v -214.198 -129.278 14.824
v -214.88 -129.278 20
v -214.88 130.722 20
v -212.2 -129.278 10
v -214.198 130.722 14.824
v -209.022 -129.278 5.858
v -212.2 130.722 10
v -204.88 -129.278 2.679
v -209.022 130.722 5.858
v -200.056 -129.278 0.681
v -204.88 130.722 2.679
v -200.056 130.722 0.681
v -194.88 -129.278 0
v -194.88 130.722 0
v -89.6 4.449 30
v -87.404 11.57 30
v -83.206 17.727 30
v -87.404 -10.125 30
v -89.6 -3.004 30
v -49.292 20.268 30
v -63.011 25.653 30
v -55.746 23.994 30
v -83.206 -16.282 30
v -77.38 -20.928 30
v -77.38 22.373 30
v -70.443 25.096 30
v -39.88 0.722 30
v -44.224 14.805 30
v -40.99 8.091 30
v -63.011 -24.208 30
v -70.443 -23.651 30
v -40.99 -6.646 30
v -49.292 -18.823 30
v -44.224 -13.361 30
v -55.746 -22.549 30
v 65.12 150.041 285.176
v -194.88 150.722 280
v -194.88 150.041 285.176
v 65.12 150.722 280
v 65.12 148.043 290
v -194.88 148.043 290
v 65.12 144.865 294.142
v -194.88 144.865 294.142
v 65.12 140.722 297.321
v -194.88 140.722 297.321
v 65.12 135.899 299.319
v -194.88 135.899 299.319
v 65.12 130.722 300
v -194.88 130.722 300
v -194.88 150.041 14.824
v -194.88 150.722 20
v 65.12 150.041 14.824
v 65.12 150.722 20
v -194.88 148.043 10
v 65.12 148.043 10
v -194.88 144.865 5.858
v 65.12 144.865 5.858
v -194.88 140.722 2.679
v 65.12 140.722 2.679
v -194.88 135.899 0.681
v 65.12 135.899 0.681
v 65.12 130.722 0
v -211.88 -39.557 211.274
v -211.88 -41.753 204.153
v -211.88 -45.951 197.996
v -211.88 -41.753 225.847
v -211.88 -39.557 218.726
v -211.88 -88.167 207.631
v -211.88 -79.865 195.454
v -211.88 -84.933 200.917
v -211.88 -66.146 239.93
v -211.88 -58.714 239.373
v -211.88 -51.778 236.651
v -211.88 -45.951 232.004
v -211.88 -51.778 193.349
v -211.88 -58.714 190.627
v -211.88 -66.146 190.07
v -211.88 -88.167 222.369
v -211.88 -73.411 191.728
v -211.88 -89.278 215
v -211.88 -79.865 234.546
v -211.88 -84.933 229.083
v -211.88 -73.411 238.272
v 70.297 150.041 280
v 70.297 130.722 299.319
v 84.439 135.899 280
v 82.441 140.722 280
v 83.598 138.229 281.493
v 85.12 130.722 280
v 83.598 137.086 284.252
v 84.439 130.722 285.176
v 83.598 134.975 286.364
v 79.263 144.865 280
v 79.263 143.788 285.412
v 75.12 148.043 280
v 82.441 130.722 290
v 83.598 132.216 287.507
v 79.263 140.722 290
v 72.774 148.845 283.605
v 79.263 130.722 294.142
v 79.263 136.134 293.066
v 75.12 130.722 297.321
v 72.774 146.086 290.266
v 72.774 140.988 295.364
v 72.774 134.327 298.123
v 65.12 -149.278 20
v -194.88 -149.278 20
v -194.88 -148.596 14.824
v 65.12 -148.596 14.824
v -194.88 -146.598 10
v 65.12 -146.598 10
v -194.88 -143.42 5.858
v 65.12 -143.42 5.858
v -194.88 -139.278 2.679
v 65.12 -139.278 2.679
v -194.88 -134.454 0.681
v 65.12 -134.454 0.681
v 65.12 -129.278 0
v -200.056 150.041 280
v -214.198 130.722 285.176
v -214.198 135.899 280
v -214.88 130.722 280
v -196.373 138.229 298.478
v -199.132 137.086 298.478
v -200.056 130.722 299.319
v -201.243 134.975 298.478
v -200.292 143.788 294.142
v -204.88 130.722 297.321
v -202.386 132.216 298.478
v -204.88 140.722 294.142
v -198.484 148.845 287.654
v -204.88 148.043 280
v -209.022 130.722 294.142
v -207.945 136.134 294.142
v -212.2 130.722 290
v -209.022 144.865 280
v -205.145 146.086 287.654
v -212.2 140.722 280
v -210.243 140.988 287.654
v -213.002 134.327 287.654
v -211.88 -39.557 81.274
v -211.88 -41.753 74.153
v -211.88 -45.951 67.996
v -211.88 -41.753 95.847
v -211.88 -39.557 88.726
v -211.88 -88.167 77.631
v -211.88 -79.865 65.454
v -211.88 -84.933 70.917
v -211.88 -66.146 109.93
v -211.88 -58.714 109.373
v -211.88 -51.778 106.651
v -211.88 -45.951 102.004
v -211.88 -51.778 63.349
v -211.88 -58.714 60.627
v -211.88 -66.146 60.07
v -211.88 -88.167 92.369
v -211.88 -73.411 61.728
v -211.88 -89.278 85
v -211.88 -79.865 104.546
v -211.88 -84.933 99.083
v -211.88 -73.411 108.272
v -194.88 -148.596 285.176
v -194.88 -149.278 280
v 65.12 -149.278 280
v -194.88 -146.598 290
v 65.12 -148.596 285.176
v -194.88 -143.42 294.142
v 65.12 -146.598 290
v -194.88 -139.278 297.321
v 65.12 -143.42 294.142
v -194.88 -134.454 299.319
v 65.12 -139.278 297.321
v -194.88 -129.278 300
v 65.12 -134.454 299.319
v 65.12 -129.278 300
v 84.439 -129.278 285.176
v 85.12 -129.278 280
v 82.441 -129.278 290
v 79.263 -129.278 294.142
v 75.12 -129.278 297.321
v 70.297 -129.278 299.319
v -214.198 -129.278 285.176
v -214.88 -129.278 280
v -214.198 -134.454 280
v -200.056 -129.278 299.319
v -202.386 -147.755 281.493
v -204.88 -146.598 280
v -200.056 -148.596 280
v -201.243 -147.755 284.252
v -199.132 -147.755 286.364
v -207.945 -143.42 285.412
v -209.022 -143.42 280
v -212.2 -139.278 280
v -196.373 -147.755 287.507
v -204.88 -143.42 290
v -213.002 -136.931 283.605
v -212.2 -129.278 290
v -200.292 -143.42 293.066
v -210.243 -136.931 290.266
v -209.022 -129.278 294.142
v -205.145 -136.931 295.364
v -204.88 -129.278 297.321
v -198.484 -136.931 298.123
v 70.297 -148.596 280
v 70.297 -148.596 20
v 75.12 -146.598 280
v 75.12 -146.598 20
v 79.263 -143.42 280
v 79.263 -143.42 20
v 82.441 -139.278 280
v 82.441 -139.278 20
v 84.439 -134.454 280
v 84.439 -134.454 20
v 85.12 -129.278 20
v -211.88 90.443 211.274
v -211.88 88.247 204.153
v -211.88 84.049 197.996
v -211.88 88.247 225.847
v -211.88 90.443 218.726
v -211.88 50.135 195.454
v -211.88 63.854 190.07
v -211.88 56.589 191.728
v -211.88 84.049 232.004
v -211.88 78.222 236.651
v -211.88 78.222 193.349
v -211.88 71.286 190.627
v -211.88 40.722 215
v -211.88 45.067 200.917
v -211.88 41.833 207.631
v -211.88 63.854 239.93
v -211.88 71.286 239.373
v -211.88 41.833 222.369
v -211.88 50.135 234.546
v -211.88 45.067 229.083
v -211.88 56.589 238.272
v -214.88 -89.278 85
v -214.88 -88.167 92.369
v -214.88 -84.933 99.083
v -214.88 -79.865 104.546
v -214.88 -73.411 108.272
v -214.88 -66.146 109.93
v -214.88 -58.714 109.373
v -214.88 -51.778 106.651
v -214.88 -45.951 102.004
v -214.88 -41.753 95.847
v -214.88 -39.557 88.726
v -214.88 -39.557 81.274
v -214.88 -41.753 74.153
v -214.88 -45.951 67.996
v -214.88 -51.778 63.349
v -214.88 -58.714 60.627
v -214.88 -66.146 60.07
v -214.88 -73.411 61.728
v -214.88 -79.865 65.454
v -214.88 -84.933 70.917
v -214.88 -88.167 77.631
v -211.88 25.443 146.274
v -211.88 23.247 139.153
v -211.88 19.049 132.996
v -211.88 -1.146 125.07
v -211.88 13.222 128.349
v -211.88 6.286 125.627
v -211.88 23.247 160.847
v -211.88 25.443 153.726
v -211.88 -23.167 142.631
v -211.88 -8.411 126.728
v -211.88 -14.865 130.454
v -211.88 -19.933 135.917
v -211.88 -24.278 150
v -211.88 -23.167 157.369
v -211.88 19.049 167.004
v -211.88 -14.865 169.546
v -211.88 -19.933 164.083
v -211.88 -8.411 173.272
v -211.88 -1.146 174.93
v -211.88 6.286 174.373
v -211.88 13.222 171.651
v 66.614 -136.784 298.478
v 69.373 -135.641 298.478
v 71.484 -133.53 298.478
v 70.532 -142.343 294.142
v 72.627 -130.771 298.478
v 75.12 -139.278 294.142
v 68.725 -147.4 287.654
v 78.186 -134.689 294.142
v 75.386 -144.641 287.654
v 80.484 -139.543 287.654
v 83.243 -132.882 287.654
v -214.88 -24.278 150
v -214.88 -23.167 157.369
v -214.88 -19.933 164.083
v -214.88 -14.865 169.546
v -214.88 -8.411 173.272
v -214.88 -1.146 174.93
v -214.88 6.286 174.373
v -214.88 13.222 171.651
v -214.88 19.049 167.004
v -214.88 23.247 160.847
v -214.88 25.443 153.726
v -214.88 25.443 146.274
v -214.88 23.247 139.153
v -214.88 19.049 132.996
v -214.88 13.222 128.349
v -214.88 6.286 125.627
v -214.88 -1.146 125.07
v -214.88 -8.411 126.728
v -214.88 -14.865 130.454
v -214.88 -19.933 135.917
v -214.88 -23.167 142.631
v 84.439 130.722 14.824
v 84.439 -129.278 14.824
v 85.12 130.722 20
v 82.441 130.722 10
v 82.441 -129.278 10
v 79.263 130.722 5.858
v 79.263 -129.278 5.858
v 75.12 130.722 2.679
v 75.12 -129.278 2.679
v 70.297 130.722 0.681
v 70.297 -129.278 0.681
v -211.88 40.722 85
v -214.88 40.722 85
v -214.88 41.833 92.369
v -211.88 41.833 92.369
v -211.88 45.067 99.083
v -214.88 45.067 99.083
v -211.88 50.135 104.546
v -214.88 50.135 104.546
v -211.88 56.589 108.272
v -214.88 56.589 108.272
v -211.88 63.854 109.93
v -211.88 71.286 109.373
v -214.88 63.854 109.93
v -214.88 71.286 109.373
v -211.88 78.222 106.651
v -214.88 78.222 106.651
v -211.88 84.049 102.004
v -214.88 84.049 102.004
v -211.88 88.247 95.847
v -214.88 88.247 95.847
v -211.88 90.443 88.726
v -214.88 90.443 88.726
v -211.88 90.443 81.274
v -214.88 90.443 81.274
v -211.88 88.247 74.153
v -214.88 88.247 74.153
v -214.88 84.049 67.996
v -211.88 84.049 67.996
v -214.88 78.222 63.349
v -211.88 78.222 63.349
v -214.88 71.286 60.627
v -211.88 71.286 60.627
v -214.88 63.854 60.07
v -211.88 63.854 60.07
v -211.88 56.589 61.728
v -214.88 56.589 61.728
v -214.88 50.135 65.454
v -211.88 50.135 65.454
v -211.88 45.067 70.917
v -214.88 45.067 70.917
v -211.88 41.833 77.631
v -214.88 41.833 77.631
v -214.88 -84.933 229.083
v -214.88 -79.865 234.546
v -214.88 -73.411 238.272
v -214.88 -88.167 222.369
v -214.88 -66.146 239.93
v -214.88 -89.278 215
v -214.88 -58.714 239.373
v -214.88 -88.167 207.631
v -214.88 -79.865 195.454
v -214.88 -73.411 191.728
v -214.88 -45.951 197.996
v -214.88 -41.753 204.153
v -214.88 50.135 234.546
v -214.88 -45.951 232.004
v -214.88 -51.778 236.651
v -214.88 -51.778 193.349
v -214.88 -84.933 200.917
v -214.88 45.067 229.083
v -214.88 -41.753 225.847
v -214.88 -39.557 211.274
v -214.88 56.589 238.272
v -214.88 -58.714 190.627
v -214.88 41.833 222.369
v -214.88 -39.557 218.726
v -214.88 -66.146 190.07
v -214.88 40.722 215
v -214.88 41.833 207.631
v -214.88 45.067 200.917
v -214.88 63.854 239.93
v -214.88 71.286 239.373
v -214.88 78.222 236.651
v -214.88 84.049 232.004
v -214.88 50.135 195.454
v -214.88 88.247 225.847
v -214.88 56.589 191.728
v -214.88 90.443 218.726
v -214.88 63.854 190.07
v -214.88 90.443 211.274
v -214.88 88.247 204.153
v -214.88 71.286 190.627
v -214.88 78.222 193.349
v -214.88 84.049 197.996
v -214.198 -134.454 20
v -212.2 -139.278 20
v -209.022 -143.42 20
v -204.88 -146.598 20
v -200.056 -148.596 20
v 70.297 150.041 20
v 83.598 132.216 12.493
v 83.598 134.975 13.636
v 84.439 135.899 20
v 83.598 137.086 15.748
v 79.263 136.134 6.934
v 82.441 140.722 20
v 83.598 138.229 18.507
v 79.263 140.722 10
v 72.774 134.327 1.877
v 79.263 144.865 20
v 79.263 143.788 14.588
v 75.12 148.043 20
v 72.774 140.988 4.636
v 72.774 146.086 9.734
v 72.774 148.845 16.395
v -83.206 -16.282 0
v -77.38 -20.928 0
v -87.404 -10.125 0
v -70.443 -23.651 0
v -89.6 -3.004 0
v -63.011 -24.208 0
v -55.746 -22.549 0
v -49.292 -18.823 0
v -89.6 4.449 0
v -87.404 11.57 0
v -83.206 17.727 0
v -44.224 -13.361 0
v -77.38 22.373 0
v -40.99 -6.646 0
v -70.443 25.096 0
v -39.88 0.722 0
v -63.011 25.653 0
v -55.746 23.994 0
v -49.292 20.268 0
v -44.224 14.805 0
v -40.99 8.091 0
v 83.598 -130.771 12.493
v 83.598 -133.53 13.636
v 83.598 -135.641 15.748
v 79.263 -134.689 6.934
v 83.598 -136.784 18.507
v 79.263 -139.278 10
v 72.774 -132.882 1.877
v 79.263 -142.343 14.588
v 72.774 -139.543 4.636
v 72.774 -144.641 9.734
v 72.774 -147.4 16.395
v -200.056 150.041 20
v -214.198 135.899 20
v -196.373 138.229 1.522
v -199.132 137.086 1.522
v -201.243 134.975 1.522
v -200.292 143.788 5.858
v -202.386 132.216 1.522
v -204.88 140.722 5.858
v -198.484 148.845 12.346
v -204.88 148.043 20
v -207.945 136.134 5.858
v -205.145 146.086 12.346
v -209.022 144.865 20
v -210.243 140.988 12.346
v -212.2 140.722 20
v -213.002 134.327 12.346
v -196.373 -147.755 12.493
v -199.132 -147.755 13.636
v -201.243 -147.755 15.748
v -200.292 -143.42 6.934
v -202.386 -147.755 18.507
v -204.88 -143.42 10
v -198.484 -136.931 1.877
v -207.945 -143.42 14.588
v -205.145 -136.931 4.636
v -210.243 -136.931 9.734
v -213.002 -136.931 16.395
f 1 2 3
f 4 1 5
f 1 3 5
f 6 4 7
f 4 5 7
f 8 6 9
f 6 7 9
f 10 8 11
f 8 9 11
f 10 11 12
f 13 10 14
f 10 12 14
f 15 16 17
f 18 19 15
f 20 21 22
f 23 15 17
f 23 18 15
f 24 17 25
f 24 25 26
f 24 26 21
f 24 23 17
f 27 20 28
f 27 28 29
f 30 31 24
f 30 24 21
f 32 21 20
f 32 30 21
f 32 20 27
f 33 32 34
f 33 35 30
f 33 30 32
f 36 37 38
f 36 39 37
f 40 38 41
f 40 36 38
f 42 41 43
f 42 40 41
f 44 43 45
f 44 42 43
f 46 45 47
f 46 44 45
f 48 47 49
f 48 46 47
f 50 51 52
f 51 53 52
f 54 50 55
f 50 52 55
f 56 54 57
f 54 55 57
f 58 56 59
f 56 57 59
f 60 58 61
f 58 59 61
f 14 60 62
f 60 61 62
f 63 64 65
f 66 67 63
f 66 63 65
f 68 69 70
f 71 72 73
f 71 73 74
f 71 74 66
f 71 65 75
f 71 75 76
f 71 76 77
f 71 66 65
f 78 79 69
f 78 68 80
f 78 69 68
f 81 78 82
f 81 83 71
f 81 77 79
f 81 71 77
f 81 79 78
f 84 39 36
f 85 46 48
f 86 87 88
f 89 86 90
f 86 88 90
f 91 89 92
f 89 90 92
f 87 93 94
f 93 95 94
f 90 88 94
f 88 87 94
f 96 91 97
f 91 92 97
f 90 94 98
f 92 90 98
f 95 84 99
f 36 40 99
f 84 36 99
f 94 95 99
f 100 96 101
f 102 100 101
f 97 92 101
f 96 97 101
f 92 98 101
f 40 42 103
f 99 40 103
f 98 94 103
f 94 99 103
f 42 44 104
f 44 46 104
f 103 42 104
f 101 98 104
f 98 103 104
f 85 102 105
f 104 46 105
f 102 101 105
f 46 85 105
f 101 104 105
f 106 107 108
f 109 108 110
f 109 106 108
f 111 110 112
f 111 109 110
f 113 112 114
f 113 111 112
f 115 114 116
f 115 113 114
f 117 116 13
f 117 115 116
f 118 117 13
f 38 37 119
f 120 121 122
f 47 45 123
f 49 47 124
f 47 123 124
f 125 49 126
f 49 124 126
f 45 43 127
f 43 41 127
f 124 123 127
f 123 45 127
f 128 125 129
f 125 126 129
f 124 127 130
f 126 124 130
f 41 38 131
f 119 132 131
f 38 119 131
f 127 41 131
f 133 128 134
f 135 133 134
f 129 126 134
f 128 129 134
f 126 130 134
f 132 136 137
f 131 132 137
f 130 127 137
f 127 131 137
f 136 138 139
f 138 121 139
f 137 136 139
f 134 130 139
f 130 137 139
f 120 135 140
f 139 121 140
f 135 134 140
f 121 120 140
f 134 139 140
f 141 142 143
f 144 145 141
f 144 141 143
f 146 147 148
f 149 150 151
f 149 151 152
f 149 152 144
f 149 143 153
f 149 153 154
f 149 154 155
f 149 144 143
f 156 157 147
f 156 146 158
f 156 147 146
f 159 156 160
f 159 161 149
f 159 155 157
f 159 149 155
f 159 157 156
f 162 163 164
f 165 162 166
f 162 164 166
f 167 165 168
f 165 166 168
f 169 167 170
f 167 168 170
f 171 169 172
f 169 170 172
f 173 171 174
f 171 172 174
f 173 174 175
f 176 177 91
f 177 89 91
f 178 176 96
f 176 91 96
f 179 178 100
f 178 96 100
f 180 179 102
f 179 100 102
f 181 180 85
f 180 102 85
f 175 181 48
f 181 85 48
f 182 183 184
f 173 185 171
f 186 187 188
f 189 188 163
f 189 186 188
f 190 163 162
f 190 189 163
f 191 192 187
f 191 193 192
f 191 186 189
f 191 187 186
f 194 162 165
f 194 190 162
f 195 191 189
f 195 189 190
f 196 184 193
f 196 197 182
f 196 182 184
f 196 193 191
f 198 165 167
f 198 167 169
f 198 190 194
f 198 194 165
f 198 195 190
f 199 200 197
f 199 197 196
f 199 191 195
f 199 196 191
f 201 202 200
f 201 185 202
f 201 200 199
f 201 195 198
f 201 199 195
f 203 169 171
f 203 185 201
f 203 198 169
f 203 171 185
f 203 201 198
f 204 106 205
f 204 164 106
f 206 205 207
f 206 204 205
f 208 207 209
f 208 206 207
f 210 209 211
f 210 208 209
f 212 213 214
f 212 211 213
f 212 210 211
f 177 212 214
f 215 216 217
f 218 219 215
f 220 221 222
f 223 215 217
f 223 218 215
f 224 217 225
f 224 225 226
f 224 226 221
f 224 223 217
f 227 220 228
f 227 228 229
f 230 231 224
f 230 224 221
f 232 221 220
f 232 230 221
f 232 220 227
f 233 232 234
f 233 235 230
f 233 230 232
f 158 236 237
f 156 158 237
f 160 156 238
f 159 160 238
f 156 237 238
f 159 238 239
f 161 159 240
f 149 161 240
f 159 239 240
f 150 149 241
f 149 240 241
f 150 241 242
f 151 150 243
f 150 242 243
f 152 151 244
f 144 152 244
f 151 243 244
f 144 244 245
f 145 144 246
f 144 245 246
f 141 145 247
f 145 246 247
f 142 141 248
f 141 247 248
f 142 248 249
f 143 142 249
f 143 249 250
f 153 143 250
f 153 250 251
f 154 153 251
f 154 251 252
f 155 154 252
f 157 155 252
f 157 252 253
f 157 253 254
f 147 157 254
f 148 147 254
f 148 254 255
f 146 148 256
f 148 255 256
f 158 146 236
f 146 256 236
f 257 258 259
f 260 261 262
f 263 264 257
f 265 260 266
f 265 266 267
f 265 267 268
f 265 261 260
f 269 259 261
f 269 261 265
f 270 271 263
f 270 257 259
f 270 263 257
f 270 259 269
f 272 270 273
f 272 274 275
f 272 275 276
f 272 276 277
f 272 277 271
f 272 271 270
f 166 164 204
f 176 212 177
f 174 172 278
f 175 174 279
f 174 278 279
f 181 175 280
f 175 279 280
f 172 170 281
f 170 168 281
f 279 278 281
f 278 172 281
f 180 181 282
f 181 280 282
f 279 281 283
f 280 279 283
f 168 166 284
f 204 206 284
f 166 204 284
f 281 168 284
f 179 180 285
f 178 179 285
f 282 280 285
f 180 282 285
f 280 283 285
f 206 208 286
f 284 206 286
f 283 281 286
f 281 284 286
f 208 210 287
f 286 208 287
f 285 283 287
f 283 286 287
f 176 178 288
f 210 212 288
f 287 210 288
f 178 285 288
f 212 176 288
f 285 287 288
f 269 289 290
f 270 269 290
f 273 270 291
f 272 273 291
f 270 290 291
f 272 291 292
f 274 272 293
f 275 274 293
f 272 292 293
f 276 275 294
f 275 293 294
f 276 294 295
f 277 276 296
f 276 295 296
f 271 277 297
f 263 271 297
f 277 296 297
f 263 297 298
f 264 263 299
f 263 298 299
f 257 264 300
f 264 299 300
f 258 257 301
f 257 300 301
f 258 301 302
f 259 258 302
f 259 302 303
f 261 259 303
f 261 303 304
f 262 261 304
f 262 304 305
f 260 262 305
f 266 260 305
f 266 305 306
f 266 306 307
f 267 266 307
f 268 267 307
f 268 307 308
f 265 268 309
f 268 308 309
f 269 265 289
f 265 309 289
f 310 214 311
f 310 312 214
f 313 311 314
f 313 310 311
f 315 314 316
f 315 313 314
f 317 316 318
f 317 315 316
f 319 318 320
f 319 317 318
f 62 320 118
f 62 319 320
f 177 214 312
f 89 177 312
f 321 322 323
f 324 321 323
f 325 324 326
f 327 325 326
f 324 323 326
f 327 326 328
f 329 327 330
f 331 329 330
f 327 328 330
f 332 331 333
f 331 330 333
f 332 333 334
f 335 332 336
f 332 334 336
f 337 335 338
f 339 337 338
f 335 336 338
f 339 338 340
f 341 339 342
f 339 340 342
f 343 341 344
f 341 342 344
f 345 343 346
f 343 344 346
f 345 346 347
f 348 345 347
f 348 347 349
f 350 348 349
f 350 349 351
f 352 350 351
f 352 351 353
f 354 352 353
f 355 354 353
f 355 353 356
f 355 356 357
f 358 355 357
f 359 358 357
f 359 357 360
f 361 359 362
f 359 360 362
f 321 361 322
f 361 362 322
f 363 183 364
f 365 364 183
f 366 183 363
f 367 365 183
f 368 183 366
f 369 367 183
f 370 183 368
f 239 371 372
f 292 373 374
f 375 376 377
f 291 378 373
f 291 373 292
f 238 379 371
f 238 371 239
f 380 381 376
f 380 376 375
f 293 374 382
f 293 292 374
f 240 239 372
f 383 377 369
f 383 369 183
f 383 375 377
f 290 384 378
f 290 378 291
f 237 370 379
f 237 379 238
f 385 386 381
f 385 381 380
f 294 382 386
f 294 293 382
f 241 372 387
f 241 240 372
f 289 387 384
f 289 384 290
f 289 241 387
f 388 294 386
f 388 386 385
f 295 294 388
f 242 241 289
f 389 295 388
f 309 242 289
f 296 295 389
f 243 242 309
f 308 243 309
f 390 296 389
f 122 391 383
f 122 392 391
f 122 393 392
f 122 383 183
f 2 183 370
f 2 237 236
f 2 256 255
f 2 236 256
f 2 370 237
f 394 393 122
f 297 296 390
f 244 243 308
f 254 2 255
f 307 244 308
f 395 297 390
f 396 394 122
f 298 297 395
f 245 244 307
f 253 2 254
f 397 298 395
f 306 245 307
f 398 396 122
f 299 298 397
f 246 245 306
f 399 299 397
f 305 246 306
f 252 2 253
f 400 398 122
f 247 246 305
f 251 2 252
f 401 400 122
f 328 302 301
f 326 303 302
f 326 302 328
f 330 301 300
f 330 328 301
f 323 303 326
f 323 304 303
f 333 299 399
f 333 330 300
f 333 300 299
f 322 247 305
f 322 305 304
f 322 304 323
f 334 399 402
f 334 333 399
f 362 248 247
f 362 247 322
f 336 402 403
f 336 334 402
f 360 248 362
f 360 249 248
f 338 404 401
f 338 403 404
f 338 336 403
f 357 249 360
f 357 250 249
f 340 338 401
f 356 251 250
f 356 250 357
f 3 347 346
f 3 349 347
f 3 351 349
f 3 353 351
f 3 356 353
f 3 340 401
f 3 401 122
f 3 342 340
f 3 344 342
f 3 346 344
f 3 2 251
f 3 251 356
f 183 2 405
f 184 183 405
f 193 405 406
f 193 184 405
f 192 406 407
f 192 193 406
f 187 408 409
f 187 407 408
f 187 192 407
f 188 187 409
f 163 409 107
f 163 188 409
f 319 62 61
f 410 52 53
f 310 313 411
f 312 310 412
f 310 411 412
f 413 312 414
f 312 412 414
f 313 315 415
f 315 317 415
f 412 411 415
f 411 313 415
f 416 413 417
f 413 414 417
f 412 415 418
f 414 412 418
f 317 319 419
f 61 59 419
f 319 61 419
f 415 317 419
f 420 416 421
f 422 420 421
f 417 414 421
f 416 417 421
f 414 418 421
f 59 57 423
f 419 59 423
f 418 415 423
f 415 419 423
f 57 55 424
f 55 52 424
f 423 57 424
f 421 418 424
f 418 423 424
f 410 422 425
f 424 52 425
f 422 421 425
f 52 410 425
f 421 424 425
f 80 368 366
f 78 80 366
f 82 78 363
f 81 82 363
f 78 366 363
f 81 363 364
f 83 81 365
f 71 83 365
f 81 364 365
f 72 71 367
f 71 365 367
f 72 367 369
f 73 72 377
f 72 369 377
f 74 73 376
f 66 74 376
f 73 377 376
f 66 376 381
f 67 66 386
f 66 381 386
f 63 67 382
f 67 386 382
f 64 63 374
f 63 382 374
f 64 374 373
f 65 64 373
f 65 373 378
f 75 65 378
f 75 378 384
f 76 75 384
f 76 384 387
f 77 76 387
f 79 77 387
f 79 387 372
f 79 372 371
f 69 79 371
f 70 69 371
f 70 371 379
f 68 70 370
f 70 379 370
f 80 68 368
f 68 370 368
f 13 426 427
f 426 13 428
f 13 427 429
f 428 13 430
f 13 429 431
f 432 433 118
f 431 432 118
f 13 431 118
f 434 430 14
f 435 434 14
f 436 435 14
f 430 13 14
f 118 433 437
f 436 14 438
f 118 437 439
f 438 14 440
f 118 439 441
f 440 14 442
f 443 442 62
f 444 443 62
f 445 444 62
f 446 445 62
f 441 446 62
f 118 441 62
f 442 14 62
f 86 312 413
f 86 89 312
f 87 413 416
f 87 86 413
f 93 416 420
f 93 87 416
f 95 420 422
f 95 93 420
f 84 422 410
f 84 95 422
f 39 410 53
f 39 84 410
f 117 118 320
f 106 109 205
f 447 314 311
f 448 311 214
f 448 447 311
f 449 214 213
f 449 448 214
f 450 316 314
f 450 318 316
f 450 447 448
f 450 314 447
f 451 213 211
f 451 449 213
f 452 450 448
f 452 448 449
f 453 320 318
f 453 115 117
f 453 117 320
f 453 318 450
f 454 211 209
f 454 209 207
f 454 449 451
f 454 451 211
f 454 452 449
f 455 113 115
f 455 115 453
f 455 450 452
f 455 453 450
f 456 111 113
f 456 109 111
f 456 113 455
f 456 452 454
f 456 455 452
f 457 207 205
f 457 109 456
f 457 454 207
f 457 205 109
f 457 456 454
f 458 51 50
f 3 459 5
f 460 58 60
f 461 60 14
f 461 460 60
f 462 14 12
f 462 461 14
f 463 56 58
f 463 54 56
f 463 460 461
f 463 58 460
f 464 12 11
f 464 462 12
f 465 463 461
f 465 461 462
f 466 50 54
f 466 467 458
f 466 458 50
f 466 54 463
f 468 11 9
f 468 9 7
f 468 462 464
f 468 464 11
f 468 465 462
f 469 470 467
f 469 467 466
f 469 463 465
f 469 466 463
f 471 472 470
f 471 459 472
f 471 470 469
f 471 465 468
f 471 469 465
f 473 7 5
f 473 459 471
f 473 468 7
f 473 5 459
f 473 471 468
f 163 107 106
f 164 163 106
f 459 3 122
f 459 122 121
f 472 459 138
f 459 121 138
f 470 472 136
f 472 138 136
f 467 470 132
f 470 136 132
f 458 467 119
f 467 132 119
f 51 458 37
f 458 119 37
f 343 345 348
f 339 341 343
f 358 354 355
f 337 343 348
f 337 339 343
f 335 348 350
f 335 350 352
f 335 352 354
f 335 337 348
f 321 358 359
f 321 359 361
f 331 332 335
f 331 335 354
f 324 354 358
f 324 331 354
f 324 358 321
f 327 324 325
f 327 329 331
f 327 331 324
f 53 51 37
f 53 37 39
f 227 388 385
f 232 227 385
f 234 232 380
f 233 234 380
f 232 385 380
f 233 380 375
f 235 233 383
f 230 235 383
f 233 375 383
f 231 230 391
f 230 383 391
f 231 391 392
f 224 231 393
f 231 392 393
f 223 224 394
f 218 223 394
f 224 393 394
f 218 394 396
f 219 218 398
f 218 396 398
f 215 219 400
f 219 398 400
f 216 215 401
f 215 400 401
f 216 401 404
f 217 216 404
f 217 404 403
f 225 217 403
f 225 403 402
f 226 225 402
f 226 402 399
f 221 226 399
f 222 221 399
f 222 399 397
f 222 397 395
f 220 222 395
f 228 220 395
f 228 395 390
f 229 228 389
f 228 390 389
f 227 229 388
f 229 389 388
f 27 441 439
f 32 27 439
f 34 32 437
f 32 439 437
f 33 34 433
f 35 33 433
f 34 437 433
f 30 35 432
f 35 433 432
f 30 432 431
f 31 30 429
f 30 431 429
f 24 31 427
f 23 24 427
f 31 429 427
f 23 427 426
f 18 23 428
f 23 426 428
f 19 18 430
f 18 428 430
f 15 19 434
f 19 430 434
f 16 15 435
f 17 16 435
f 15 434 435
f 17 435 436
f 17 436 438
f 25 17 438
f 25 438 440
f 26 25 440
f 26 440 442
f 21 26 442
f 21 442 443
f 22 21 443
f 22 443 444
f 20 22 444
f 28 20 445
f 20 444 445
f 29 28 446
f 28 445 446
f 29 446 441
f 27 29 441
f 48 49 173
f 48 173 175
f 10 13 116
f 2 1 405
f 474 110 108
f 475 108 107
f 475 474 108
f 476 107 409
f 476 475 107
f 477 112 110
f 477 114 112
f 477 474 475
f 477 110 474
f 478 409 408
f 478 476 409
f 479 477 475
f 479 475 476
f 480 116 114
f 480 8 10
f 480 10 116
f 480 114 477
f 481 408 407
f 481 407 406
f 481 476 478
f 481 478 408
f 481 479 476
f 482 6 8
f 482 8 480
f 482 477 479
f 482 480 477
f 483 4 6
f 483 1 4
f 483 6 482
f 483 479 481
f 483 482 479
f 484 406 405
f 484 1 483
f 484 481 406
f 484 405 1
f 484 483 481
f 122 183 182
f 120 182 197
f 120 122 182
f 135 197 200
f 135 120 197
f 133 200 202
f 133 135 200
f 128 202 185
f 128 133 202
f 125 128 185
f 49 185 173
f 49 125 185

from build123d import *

# Parameters (mm, degrees)
F0_W     = 300
F0_H     = 300
F1_DEPTH = 300
F2_R     = 20
F3_R     = 25
F4_DEPTH = 30
F5_R     = 25
F6_DEPTH = 3


with BuildPart() as f1:
    # F0 (on Top) → F1 (new body)
    with BuildSketch(Plane.XY):
        with Locations((-64.879608, 0.722477)):
            Rectangle(F0_W, F0_H)
    extrude(amount=F1_DEPTH)

    # F2
    f2_edges = [f1.edges().sort_by_distance(p)[0] for p in [
        (-214.879608, 150.722477, 150),
        (-64.879608, 150.722477, 300),
        (-214.879608, 0.722477, 300),
        (-64.879608, 150.722477, 0),
        (-214.879608, 0.722477, 0),
        (-64.879608, -149.277523, 0),
        (85.120392, 0.722477, 0),
        (85.120392, 150.722477, 150),
        (-214.879608, -149.277523, 150),
        (85.120392, -149.277523, 150),
        (-64.879608, -149.277523, 300),
        (85.120392, 0.722477, 300),
    ]]
    fillet(f2_edges, radius=F2_R)

    # F3 (on face) → F4 (cut)
    with BuildSketch(Plane(origin=(0, 0, 0), x_dir=(1, 0, 0), z_dir=(0, 0, -1))):
        with Locations((-64.879608, -0.722477)):
            Circle(F3_R)
    extrude(amount=-F4_DEPTH, mode=Mode.SUBTRACT)

    # F5 (on face) → F6 (cut)
    with BuildSketch(Plane(origin=(-214.879608, 0, 0), x_dir=(0, -1, 0), z_dir=(-1, 0, 0))):
        with Locations((64.277523, 215)):
            Circle(F5_R)
        with Locations((-0.722477, 150)):
            Circle(F5_R)
        with Locations((64.277523, 85)):
            Circle(F5_R)
        with Locations((-65.722477, 85)):
            Circle(F5_R)
        with Locations((-65.722477, 215)):
            Circle(F5_R)
    extrude(amount=-F6_DEPTH, mode=Mode.SUBTRACT)


solid = f1.part
